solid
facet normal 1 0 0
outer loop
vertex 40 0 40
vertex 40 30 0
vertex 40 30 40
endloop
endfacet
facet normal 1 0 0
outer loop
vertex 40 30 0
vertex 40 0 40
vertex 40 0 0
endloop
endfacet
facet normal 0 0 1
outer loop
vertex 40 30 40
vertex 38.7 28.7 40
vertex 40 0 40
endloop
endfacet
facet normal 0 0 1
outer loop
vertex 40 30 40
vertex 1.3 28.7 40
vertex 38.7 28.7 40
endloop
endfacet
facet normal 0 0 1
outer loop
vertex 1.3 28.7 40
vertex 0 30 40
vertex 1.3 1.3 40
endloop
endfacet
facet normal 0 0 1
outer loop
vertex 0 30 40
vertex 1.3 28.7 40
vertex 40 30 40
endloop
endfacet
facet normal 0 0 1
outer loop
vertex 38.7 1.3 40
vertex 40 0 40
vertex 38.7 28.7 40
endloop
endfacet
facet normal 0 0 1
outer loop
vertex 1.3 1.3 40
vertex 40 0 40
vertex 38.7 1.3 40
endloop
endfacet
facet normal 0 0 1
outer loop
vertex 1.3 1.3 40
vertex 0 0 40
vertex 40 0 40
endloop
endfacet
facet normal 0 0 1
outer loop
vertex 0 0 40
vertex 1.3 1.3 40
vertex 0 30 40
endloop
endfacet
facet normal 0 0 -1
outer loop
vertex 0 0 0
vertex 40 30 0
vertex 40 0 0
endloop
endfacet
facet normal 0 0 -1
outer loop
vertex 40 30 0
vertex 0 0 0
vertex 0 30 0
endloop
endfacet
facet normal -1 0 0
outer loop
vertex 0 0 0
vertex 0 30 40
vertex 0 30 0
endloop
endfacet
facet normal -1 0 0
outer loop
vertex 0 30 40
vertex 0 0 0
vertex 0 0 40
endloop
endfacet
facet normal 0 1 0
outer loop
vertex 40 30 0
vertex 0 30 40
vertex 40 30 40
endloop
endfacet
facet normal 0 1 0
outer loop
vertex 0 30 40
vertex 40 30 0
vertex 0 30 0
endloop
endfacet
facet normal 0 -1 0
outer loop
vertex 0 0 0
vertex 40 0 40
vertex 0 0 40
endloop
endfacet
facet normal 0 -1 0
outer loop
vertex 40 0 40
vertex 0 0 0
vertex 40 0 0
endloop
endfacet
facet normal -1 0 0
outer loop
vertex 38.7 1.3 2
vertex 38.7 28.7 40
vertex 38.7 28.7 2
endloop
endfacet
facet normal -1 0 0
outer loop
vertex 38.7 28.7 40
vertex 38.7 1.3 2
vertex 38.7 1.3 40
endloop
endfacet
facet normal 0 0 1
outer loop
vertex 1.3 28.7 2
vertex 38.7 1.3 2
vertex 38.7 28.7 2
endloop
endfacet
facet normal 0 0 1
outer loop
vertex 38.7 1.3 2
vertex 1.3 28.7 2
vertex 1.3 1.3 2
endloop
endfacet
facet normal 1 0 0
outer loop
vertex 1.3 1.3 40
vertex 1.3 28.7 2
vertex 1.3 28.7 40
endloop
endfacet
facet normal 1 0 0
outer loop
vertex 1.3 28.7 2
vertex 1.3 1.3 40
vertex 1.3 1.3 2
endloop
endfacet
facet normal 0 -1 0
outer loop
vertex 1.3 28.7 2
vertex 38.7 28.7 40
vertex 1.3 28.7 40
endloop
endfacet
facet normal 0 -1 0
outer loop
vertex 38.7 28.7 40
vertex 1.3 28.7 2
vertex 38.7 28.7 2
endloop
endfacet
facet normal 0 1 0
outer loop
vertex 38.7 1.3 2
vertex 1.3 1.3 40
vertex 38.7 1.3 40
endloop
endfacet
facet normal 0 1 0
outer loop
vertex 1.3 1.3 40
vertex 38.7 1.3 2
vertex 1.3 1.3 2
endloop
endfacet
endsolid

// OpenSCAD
$fn = 32;

// ----------------------------------------------------------------------
// Open box: 1.3 mm walls
// ----------------------------------------------------------------------

// --- parameters (mm) ---
box_l = 40;               // outer length, X
box_w = 30;               // outer width, Y
box_h = 40;               // outer height, Z
wall = 1.3;               // wall thickness
floor = 2;                // floor thickness

difference() {
  cube([box_l, box_w, box_h]);
  translate([wall, wall, floor])
    cube([box_l - 2 * wall, box_w - 2 * wall, box_h]);
}
